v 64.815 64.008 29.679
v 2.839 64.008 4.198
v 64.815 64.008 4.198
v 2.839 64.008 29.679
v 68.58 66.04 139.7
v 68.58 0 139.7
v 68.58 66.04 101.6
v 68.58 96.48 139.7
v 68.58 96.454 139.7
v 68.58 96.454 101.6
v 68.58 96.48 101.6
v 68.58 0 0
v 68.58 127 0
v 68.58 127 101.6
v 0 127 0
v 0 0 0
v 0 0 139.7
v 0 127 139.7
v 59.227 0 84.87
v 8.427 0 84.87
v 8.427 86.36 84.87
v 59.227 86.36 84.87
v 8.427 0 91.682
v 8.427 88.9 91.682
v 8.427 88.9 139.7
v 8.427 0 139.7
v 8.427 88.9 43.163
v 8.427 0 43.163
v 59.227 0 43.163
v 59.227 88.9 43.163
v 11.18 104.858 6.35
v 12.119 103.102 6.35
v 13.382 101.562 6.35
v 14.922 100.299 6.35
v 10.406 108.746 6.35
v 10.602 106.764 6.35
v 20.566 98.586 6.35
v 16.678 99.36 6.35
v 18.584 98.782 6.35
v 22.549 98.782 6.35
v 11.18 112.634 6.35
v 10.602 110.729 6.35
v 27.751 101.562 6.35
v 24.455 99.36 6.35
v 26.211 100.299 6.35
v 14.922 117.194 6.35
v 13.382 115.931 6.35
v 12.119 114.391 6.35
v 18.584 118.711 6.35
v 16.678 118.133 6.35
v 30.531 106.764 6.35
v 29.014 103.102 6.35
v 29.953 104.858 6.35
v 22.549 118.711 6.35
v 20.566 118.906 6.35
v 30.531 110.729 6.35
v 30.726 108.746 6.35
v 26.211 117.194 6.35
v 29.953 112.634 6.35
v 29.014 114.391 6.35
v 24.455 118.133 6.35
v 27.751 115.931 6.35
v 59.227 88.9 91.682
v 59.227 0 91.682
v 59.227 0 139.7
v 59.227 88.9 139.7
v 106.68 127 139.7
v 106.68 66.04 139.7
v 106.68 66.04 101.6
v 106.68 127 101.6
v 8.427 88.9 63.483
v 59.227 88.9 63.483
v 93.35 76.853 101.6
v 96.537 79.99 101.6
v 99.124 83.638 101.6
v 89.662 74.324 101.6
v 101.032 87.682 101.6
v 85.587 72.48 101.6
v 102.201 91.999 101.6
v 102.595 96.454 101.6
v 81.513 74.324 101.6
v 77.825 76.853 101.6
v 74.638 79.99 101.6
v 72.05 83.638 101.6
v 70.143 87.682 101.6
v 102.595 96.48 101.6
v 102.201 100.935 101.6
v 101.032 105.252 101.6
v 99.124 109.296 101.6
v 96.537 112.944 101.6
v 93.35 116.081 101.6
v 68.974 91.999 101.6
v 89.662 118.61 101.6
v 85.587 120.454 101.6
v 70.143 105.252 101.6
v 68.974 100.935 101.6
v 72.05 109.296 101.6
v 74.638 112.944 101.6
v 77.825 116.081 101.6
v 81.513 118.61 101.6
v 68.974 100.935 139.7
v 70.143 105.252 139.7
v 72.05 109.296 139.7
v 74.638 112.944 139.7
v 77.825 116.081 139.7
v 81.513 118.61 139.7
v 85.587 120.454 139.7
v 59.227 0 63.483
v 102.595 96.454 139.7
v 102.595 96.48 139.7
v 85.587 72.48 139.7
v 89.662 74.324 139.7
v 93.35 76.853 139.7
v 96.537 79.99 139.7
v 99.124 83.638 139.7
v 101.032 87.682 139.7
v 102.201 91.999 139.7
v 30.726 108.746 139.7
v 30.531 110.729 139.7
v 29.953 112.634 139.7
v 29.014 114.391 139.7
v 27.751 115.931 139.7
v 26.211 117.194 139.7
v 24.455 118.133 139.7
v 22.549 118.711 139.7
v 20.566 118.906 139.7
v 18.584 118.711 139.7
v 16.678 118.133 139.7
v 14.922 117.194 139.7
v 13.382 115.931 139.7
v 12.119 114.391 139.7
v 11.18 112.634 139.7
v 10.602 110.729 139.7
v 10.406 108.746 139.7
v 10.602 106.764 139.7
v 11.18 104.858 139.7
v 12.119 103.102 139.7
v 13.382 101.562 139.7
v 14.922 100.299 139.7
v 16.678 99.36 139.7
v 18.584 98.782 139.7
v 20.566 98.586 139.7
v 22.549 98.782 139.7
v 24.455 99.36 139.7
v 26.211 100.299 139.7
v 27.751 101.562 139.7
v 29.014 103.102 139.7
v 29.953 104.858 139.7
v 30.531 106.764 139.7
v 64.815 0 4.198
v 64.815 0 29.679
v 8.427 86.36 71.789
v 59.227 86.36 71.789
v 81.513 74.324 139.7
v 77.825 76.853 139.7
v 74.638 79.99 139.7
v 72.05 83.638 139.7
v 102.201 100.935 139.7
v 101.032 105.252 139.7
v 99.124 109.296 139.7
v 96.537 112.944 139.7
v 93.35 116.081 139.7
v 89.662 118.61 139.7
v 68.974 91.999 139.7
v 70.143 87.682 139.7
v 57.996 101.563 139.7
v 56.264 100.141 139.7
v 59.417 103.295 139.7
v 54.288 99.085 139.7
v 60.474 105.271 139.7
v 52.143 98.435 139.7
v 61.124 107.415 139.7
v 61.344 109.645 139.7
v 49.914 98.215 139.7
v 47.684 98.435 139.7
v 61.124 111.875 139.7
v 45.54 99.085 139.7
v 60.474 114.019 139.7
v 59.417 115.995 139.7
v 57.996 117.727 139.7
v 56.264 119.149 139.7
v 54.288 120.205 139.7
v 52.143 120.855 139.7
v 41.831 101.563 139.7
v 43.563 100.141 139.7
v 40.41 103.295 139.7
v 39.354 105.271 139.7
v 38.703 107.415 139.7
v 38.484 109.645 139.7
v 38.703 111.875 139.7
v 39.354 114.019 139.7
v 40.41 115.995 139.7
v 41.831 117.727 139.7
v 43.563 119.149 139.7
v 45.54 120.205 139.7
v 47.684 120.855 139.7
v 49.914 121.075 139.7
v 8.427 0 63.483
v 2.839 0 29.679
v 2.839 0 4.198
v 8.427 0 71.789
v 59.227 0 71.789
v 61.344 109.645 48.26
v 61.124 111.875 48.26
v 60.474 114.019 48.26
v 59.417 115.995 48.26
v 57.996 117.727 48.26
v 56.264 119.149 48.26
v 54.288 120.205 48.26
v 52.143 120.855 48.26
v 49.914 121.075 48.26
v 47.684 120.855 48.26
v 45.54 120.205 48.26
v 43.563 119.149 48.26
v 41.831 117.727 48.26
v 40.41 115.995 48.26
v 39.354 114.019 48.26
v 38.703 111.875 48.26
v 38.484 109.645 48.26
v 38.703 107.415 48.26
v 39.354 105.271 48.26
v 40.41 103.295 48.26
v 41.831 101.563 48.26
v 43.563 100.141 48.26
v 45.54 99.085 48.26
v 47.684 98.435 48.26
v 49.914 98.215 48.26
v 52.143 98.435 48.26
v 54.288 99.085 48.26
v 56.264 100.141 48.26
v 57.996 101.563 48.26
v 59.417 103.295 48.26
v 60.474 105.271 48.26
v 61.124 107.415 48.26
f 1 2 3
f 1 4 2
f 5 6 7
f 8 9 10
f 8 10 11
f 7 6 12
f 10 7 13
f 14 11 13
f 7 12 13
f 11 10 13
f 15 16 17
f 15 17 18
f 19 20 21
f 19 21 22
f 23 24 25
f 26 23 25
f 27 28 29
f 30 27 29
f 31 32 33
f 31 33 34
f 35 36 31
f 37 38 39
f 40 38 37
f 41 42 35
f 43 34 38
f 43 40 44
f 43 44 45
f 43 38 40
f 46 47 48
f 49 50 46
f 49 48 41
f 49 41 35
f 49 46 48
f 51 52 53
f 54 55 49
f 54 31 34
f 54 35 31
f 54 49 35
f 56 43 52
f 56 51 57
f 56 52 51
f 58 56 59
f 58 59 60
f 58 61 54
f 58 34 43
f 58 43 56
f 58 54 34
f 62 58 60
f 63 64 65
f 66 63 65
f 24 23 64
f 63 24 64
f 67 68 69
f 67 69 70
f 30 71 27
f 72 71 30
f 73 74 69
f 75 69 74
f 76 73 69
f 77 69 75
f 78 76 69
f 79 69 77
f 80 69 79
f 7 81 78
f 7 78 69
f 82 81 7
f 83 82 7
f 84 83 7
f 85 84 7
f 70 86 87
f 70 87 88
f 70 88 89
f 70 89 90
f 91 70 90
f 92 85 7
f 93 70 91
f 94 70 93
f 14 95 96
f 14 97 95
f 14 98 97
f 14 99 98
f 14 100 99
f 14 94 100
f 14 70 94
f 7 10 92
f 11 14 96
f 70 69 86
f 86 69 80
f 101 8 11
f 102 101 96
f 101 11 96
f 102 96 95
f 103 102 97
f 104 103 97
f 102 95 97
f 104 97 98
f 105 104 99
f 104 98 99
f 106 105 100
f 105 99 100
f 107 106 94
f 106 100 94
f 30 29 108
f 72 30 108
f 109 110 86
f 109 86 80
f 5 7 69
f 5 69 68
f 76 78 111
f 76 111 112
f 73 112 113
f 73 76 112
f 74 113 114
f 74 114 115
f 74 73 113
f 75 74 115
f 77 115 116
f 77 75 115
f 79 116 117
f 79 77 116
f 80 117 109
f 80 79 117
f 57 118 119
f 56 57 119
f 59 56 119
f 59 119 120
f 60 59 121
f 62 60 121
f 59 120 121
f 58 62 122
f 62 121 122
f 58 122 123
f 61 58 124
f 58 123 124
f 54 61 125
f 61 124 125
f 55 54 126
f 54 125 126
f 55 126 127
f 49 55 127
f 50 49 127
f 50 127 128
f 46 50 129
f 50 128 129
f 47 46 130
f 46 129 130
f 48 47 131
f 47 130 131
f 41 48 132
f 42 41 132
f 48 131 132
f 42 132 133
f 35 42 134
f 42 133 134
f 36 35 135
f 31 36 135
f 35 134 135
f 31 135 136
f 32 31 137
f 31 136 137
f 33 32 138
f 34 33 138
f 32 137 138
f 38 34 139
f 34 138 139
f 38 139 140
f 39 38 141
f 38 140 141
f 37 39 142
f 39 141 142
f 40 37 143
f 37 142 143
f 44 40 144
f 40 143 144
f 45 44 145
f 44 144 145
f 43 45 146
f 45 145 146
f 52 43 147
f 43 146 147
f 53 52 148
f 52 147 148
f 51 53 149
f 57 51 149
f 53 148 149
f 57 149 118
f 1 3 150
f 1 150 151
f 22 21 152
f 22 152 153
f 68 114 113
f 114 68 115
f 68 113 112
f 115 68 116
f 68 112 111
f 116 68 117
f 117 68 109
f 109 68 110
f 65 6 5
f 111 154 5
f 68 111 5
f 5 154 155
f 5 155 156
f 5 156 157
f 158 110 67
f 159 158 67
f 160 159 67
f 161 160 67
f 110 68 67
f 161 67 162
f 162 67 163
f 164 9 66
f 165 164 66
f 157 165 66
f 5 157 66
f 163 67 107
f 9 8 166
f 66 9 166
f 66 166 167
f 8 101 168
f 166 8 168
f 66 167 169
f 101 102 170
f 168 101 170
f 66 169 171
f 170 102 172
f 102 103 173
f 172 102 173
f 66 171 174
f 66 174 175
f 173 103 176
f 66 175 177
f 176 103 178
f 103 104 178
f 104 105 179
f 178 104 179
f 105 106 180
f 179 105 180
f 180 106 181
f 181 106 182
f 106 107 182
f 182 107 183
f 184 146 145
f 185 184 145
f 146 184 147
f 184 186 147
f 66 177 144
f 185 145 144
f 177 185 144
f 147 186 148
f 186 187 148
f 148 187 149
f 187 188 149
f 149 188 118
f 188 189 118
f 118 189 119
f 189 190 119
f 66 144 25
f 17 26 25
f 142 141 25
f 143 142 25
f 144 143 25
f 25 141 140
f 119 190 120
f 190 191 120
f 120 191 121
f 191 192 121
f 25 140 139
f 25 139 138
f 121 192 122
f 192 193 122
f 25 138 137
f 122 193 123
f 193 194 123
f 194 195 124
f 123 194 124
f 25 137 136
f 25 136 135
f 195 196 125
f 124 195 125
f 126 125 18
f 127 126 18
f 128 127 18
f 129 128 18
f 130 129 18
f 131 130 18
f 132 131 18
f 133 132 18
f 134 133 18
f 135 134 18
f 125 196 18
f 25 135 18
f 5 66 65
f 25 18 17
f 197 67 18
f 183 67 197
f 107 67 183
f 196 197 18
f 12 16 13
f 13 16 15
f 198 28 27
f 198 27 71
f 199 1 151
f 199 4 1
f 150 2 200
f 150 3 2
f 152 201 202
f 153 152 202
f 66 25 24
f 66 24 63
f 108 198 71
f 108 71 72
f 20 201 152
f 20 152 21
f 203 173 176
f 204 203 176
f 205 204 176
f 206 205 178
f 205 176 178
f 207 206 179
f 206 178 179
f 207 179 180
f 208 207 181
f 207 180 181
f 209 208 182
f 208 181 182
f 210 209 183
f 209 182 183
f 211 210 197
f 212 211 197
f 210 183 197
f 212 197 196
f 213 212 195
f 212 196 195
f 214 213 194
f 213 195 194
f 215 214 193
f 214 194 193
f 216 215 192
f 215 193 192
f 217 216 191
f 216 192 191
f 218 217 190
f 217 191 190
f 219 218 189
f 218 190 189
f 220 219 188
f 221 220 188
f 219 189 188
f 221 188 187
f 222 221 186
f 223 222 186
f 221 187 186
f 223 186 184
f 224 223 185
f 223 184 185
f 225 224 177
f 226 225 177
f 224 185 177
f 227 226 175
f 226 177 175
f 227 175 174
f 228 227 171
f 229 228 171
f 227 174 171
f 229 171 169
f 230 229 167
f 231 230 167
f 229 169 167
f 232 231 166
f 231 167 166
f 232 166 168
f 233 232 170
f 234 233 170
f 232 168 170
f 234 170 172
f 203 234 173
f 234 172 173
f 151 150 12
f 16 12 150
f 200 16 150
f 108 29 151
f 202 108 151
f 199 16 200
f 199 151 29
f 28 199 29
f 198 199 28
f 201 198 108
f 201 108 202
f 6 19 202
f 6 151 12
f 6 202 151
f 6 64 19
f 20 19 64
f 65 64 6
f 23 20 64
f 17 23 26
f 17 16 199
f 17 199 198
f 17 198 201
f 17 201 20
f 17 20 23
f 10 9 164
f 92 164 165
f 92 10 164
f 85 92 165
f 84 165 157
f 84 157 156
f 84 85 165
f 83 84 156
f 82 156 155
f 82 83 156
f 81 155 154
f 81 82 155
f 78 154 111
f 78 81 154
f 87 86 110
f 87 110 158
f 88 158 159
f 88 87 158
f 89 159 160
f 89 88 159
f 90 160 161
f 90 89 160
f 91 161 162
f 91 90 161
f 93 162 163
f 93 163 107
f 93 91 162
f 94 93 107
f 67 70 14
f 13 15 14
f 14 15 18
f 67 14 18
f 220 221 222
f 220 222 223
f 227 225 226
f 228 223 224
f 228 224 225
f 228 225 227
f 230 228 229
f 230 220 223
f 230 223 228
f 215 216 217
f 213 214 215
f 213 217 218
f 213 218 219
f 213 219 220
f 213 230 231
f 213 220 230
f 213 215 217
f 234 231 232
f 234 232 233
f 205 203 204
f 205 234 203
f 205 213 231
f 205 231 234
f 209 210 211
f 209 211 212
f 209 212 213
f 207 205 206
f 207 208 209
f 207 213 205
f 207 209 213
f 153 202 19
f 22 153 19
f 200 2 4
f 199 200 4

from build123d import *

# Parameters (mm, degrees)
F0_W         = 76.2
F0_H         = 127
F1_DEPTH     = 139.7
F2_R         = 11.43
F3_DEPTH     = 91.44
F4_R         = 10.16
F5_DEPTH     = 133.35
F6_DEPTH     = 12.7
F8_DEPTH     = 5.08
F7_W         = 60.1533111874
F7_H         = 25.4809018224
F7_W_2       = 0.8066888126
F9_DEPTH     = 63.5
F10_DEPTH    = 91.44
F11_R        = 11.43
F12_DEPTH    = 91.44
F13_W        = 60.96
F13_H        = 20.32
F14_DEPTH    = 88.9
F15_DEPTH    = 5.08
F16_DEPTH    = 5.08
F17_W        = 50.8
F17_H        = 12.7
F18_DEPTH    = 86.36
F19_W        = 50.8
F19_H        = 48.0175957203
F20_DEPTH    = 88.9
F21_W        = 6.7573417909
F21_H        = 48.0175957203
F22_DEPTH    = 55.88
F23_W        = 60.96
F23_H        = 38.1
F24_DEPTH    = 38.1
F25_W        = 34.0146065784
F25_H        = 50.826728344
F26_DEPTH    = 50.8
F27_T1_DEPTH = 38.1
F28_DEPTH    = 0.508
F29_DEPTH    = 0.508
F30_DEPTH    = 0.508
F31_DEPTH    = 0.381
F32_DEPTH    = 25.4


# Not quite as in the source:
# - a fillet or chamfer that OpenCascade refuses, or shapes differently, is made with other operations: its cross-section is extruded or revolved along the edge and cut away or added


with BuildPart() as f1:
    # F0 (on Top) → F1 (new body)
    with BuildSketch(Plane.XY):
        with Locations((38.1, 63.5)):
            Rectangle(F0_W, F0_H)
    extrude(amount=F1_DEPTH)

    # F2 (on face) → F3 (cut)
    with BuildSketch(Plane.XY.offset(139.7)):
        with Locations((18.5702368617, 17.6018252969)):
            Circle(F2_R)
    extrude(amount=-F3_DEPTH, mode=Mode.SUBTRACT)

    # F4 (on face) → F5 (cut)
    with BuildSketch(Plane.XY.offset(139.7)):
        with Locations((20.5664373934, 108.7463870645)):
            Circle(F4_R)
    extrude(amount=-F5_DEPTH, mode=Mode.SUBTRACT)

    # F6 (cut): a face of the model
    f6_faces = [f1.faces().sort_by_distance(p)[0] for p in [
        (76.2, 63.5, 69.85),
    ]]
    extrude(f6_faces, amount=-F6_DEPTH, mode=Mode.SUBTRACT)

    # F8 (add): a face of the model
    f8_faces = [f1.faces().sort_by_distance(p)[0] for p in [
        (63.5, 63.5, 69.85),
    ]]
    extrude(f8_faces, amount=F8_DEPTH)

    # F7 (on face) → F9 (cut)
    with BuildSketch(Plane.XZ):
        with Locations((33.4233444063, 16.9386500493)):
            Rectangle(F7_W, F7_H)
        with Locations((63.9033444063, 16.9386500493)):
            Rectangle(F7_W_2, F7_H)
    extrude(amount=-F9_DEPTH, mode=Mode.SUBTRACT)

    # F10 (add): a face of the model
    f10_faces = [f1.faces().sort_by_distance(p)[0] for p in [
        (18.5702368617, 17.6018252969, 48.26),
    ]]
    extrude(f10_faces, amount=F10_DEPTH)

    # F11 (on face) → F12 (cut)
    with BuildSketch(Plane.XY.offset(139.7)):
        with Locations((49.913611263, 109.6450760961)):
            Circle(F11_R)
    extrude(amount=-F12_DEPTH, mode=Mode.SUBTRACT)

    # F13 (on face) → F14 (cut)
    with BuildSketch(Plane.XZ):
        with Locations((33.8266888126, 53.3226364589)):
            Rectangle(F13_W, F13_H)
    extrude(amount=-F14_DEPTH, mode=Mode.SUBTRACT)

    # F15 (add): a face of the model
    f15_faces = [f1.faces().sort_by_distance(p)[0] for p in [
        (3.3466888126, 44.45, 53.3226364589),
    ]]
    extrude(f15_faces, amount=F15_DEPTH)

    # F16 (add): a face of the model
    f16_faces = [f1.faces().sort_by_distance(p)[0] for p in [
        (64.3066888126, 44.45, 53.3226364589),
    ]]
    extrude(f16_faces, amount=F16_DEPTH)

    # F17 (on face) → F18 (cut)
    with BuildSketch(Plane.XZ):
        with Locations((33.8266888126, 78.1391007662)):
            Rectangle(F17_W, F17_H)
    extrude(amount=-F18_DEPTH, mode=Mode.SUBTRACT)

    # F19 (on face) → F20 (cut)
    with BuildSketch(Plane.XZ):
        with Locations((33.8266888126, 115.6912021399)):
            Rectangle(F19_W, F19_H)
    extrude(amount=-F20_DEPTH, mode=Mode.SUBTRACT)

    # F21 (on face) → F22 (join)
    with BuildSketch(Plane.YZ.offset(8.4266888126)):
        with Locations((3.3786708955, 115.6912021399)):
            Rectangle(F21_W, F21_H)
    extrude(amount=F22_DEPTH)

    # F23 (on face) → F24 (join)
    with BuildSketch(Plane.YZ.offset(68.58)):
        with Locations((96.52, 120.65)):
            Rectangle(F23_W, F23_H)
    extrude(amount=F24_DEPTH)

    # F25 (on face) → F26 (cut)
    with BuildSketch(Plane(origin=(0, 0, 101.6), x_dir=(1, 0, 0), z_dir=(0, 0, -1))):
        with Locations((85.5873032892, -96.4670181274)):
            Rectangle(F25_W, F25_H)
    extrude(amount=-F26_DEPTH, mode=Mode.SUBTRACT)

    # F27: fillet of radius 25.4 on 4 edges, made by hand

    # F27_s2 → F27_t1 (join)
    with BuildSketch(Plane.XY.offset(101.6)):
        with BuildLine():
            ThreePointArc((77.1946065784, 71.0536539555), (95.1551188205, 78.4931417133), (102.5946065784, 96.4536539555))
            Line((102.5946065784, 96.4536539555), (102.5946065784, 71.0536539555))
            Line((102.5946065784, 71.0536539555), (77.1946065784, 71.0536539555))
        make_face()
        with BuildLine():
            ThreePointArc((102.5946065784, 96.4803822994), (95.1551188205, 114.4408945416), (77.1946065784, 121.8803822994))
            Line((77.1946065784, 121.8803822994), (102.5946065784, 121.8803822994))
            Line((102.5946065784, 121.8803822994), (102.5946065784, 96.4803822994))
        make_face()
        with BuildLine():
            ThreePointArc((68.58, 96.4536539555), (76.0194877579, 78.4931417133), (93.98, 71.0536539555))
            Line((93.98, 71.0536539555), (68.58, 71.0536539555))
            Line((68.58, 71.0536539555), (68.58, 96.4536539555))
        make_face()
        with BuildLine():
            ThreePointArc((68.58, 96.4803822994), (76.0194877579, 114.4408945416), (93.98, 121.8803822994))
            Line((93.98, 121.8803822994), (68.58, 121.8803822994))
            Line((68.58, 121.8803822994), (68.58, 96.4803822994))
        make_face()
    extrude(amount=F27_T1_DEPTH)

    # F28 (cut): a face of the model
    f28_faces = [f1.faces().sort_by_distance(p)[0] for p in [
        (33.8266888126, 63.5, 16.9386500493),
    ]]
    extrude(f28_faces, amount=-F28_DEPTH, mode=Mode.SUBTRACT)

    # F29 (cut): a face of the model
    f29_faces = [f1.faces().sort_by_distance(p)[0] for p in [
        (3.3466888126, 32.004, 16.9386500493),
    ]]
    extrude(f29_faces, amount=-F29_DEPTH, mode=Mode.SUBTRACT)

    # F30 (cut): a face of the model
    f30_faces = [f1.faces().sort_by_distance(p)[0] for p in [
        (64.3066888126, 32.004, 16.9386500493),
    ]]
    extrude(f30_faces, amount=-F30_DEPTH, mode=Mode.SUBTRACT)

    # F31 (cut): a face of the model
    f31_faces = [f1.faces().sort_by_distance(p)[0] for p in [
        (33.8266888126, 43.18, 84.4891007662),
    ]]
    extrude(f31_faces, amount=-F31_DEPTH, mode=Mode.SUBTRACT)

    # F32 (cut): a face of the model
    f32_faces = [f1.faces().sort_by_distance(p)[0] for p in [
        (33.8266888126, 6.7573417909, 115.6912021399),
    ]]
    extrude(f32_faces, amount=-F32_DEPTH, mode=Mode.SUBTRACT)


solid = f1.part
